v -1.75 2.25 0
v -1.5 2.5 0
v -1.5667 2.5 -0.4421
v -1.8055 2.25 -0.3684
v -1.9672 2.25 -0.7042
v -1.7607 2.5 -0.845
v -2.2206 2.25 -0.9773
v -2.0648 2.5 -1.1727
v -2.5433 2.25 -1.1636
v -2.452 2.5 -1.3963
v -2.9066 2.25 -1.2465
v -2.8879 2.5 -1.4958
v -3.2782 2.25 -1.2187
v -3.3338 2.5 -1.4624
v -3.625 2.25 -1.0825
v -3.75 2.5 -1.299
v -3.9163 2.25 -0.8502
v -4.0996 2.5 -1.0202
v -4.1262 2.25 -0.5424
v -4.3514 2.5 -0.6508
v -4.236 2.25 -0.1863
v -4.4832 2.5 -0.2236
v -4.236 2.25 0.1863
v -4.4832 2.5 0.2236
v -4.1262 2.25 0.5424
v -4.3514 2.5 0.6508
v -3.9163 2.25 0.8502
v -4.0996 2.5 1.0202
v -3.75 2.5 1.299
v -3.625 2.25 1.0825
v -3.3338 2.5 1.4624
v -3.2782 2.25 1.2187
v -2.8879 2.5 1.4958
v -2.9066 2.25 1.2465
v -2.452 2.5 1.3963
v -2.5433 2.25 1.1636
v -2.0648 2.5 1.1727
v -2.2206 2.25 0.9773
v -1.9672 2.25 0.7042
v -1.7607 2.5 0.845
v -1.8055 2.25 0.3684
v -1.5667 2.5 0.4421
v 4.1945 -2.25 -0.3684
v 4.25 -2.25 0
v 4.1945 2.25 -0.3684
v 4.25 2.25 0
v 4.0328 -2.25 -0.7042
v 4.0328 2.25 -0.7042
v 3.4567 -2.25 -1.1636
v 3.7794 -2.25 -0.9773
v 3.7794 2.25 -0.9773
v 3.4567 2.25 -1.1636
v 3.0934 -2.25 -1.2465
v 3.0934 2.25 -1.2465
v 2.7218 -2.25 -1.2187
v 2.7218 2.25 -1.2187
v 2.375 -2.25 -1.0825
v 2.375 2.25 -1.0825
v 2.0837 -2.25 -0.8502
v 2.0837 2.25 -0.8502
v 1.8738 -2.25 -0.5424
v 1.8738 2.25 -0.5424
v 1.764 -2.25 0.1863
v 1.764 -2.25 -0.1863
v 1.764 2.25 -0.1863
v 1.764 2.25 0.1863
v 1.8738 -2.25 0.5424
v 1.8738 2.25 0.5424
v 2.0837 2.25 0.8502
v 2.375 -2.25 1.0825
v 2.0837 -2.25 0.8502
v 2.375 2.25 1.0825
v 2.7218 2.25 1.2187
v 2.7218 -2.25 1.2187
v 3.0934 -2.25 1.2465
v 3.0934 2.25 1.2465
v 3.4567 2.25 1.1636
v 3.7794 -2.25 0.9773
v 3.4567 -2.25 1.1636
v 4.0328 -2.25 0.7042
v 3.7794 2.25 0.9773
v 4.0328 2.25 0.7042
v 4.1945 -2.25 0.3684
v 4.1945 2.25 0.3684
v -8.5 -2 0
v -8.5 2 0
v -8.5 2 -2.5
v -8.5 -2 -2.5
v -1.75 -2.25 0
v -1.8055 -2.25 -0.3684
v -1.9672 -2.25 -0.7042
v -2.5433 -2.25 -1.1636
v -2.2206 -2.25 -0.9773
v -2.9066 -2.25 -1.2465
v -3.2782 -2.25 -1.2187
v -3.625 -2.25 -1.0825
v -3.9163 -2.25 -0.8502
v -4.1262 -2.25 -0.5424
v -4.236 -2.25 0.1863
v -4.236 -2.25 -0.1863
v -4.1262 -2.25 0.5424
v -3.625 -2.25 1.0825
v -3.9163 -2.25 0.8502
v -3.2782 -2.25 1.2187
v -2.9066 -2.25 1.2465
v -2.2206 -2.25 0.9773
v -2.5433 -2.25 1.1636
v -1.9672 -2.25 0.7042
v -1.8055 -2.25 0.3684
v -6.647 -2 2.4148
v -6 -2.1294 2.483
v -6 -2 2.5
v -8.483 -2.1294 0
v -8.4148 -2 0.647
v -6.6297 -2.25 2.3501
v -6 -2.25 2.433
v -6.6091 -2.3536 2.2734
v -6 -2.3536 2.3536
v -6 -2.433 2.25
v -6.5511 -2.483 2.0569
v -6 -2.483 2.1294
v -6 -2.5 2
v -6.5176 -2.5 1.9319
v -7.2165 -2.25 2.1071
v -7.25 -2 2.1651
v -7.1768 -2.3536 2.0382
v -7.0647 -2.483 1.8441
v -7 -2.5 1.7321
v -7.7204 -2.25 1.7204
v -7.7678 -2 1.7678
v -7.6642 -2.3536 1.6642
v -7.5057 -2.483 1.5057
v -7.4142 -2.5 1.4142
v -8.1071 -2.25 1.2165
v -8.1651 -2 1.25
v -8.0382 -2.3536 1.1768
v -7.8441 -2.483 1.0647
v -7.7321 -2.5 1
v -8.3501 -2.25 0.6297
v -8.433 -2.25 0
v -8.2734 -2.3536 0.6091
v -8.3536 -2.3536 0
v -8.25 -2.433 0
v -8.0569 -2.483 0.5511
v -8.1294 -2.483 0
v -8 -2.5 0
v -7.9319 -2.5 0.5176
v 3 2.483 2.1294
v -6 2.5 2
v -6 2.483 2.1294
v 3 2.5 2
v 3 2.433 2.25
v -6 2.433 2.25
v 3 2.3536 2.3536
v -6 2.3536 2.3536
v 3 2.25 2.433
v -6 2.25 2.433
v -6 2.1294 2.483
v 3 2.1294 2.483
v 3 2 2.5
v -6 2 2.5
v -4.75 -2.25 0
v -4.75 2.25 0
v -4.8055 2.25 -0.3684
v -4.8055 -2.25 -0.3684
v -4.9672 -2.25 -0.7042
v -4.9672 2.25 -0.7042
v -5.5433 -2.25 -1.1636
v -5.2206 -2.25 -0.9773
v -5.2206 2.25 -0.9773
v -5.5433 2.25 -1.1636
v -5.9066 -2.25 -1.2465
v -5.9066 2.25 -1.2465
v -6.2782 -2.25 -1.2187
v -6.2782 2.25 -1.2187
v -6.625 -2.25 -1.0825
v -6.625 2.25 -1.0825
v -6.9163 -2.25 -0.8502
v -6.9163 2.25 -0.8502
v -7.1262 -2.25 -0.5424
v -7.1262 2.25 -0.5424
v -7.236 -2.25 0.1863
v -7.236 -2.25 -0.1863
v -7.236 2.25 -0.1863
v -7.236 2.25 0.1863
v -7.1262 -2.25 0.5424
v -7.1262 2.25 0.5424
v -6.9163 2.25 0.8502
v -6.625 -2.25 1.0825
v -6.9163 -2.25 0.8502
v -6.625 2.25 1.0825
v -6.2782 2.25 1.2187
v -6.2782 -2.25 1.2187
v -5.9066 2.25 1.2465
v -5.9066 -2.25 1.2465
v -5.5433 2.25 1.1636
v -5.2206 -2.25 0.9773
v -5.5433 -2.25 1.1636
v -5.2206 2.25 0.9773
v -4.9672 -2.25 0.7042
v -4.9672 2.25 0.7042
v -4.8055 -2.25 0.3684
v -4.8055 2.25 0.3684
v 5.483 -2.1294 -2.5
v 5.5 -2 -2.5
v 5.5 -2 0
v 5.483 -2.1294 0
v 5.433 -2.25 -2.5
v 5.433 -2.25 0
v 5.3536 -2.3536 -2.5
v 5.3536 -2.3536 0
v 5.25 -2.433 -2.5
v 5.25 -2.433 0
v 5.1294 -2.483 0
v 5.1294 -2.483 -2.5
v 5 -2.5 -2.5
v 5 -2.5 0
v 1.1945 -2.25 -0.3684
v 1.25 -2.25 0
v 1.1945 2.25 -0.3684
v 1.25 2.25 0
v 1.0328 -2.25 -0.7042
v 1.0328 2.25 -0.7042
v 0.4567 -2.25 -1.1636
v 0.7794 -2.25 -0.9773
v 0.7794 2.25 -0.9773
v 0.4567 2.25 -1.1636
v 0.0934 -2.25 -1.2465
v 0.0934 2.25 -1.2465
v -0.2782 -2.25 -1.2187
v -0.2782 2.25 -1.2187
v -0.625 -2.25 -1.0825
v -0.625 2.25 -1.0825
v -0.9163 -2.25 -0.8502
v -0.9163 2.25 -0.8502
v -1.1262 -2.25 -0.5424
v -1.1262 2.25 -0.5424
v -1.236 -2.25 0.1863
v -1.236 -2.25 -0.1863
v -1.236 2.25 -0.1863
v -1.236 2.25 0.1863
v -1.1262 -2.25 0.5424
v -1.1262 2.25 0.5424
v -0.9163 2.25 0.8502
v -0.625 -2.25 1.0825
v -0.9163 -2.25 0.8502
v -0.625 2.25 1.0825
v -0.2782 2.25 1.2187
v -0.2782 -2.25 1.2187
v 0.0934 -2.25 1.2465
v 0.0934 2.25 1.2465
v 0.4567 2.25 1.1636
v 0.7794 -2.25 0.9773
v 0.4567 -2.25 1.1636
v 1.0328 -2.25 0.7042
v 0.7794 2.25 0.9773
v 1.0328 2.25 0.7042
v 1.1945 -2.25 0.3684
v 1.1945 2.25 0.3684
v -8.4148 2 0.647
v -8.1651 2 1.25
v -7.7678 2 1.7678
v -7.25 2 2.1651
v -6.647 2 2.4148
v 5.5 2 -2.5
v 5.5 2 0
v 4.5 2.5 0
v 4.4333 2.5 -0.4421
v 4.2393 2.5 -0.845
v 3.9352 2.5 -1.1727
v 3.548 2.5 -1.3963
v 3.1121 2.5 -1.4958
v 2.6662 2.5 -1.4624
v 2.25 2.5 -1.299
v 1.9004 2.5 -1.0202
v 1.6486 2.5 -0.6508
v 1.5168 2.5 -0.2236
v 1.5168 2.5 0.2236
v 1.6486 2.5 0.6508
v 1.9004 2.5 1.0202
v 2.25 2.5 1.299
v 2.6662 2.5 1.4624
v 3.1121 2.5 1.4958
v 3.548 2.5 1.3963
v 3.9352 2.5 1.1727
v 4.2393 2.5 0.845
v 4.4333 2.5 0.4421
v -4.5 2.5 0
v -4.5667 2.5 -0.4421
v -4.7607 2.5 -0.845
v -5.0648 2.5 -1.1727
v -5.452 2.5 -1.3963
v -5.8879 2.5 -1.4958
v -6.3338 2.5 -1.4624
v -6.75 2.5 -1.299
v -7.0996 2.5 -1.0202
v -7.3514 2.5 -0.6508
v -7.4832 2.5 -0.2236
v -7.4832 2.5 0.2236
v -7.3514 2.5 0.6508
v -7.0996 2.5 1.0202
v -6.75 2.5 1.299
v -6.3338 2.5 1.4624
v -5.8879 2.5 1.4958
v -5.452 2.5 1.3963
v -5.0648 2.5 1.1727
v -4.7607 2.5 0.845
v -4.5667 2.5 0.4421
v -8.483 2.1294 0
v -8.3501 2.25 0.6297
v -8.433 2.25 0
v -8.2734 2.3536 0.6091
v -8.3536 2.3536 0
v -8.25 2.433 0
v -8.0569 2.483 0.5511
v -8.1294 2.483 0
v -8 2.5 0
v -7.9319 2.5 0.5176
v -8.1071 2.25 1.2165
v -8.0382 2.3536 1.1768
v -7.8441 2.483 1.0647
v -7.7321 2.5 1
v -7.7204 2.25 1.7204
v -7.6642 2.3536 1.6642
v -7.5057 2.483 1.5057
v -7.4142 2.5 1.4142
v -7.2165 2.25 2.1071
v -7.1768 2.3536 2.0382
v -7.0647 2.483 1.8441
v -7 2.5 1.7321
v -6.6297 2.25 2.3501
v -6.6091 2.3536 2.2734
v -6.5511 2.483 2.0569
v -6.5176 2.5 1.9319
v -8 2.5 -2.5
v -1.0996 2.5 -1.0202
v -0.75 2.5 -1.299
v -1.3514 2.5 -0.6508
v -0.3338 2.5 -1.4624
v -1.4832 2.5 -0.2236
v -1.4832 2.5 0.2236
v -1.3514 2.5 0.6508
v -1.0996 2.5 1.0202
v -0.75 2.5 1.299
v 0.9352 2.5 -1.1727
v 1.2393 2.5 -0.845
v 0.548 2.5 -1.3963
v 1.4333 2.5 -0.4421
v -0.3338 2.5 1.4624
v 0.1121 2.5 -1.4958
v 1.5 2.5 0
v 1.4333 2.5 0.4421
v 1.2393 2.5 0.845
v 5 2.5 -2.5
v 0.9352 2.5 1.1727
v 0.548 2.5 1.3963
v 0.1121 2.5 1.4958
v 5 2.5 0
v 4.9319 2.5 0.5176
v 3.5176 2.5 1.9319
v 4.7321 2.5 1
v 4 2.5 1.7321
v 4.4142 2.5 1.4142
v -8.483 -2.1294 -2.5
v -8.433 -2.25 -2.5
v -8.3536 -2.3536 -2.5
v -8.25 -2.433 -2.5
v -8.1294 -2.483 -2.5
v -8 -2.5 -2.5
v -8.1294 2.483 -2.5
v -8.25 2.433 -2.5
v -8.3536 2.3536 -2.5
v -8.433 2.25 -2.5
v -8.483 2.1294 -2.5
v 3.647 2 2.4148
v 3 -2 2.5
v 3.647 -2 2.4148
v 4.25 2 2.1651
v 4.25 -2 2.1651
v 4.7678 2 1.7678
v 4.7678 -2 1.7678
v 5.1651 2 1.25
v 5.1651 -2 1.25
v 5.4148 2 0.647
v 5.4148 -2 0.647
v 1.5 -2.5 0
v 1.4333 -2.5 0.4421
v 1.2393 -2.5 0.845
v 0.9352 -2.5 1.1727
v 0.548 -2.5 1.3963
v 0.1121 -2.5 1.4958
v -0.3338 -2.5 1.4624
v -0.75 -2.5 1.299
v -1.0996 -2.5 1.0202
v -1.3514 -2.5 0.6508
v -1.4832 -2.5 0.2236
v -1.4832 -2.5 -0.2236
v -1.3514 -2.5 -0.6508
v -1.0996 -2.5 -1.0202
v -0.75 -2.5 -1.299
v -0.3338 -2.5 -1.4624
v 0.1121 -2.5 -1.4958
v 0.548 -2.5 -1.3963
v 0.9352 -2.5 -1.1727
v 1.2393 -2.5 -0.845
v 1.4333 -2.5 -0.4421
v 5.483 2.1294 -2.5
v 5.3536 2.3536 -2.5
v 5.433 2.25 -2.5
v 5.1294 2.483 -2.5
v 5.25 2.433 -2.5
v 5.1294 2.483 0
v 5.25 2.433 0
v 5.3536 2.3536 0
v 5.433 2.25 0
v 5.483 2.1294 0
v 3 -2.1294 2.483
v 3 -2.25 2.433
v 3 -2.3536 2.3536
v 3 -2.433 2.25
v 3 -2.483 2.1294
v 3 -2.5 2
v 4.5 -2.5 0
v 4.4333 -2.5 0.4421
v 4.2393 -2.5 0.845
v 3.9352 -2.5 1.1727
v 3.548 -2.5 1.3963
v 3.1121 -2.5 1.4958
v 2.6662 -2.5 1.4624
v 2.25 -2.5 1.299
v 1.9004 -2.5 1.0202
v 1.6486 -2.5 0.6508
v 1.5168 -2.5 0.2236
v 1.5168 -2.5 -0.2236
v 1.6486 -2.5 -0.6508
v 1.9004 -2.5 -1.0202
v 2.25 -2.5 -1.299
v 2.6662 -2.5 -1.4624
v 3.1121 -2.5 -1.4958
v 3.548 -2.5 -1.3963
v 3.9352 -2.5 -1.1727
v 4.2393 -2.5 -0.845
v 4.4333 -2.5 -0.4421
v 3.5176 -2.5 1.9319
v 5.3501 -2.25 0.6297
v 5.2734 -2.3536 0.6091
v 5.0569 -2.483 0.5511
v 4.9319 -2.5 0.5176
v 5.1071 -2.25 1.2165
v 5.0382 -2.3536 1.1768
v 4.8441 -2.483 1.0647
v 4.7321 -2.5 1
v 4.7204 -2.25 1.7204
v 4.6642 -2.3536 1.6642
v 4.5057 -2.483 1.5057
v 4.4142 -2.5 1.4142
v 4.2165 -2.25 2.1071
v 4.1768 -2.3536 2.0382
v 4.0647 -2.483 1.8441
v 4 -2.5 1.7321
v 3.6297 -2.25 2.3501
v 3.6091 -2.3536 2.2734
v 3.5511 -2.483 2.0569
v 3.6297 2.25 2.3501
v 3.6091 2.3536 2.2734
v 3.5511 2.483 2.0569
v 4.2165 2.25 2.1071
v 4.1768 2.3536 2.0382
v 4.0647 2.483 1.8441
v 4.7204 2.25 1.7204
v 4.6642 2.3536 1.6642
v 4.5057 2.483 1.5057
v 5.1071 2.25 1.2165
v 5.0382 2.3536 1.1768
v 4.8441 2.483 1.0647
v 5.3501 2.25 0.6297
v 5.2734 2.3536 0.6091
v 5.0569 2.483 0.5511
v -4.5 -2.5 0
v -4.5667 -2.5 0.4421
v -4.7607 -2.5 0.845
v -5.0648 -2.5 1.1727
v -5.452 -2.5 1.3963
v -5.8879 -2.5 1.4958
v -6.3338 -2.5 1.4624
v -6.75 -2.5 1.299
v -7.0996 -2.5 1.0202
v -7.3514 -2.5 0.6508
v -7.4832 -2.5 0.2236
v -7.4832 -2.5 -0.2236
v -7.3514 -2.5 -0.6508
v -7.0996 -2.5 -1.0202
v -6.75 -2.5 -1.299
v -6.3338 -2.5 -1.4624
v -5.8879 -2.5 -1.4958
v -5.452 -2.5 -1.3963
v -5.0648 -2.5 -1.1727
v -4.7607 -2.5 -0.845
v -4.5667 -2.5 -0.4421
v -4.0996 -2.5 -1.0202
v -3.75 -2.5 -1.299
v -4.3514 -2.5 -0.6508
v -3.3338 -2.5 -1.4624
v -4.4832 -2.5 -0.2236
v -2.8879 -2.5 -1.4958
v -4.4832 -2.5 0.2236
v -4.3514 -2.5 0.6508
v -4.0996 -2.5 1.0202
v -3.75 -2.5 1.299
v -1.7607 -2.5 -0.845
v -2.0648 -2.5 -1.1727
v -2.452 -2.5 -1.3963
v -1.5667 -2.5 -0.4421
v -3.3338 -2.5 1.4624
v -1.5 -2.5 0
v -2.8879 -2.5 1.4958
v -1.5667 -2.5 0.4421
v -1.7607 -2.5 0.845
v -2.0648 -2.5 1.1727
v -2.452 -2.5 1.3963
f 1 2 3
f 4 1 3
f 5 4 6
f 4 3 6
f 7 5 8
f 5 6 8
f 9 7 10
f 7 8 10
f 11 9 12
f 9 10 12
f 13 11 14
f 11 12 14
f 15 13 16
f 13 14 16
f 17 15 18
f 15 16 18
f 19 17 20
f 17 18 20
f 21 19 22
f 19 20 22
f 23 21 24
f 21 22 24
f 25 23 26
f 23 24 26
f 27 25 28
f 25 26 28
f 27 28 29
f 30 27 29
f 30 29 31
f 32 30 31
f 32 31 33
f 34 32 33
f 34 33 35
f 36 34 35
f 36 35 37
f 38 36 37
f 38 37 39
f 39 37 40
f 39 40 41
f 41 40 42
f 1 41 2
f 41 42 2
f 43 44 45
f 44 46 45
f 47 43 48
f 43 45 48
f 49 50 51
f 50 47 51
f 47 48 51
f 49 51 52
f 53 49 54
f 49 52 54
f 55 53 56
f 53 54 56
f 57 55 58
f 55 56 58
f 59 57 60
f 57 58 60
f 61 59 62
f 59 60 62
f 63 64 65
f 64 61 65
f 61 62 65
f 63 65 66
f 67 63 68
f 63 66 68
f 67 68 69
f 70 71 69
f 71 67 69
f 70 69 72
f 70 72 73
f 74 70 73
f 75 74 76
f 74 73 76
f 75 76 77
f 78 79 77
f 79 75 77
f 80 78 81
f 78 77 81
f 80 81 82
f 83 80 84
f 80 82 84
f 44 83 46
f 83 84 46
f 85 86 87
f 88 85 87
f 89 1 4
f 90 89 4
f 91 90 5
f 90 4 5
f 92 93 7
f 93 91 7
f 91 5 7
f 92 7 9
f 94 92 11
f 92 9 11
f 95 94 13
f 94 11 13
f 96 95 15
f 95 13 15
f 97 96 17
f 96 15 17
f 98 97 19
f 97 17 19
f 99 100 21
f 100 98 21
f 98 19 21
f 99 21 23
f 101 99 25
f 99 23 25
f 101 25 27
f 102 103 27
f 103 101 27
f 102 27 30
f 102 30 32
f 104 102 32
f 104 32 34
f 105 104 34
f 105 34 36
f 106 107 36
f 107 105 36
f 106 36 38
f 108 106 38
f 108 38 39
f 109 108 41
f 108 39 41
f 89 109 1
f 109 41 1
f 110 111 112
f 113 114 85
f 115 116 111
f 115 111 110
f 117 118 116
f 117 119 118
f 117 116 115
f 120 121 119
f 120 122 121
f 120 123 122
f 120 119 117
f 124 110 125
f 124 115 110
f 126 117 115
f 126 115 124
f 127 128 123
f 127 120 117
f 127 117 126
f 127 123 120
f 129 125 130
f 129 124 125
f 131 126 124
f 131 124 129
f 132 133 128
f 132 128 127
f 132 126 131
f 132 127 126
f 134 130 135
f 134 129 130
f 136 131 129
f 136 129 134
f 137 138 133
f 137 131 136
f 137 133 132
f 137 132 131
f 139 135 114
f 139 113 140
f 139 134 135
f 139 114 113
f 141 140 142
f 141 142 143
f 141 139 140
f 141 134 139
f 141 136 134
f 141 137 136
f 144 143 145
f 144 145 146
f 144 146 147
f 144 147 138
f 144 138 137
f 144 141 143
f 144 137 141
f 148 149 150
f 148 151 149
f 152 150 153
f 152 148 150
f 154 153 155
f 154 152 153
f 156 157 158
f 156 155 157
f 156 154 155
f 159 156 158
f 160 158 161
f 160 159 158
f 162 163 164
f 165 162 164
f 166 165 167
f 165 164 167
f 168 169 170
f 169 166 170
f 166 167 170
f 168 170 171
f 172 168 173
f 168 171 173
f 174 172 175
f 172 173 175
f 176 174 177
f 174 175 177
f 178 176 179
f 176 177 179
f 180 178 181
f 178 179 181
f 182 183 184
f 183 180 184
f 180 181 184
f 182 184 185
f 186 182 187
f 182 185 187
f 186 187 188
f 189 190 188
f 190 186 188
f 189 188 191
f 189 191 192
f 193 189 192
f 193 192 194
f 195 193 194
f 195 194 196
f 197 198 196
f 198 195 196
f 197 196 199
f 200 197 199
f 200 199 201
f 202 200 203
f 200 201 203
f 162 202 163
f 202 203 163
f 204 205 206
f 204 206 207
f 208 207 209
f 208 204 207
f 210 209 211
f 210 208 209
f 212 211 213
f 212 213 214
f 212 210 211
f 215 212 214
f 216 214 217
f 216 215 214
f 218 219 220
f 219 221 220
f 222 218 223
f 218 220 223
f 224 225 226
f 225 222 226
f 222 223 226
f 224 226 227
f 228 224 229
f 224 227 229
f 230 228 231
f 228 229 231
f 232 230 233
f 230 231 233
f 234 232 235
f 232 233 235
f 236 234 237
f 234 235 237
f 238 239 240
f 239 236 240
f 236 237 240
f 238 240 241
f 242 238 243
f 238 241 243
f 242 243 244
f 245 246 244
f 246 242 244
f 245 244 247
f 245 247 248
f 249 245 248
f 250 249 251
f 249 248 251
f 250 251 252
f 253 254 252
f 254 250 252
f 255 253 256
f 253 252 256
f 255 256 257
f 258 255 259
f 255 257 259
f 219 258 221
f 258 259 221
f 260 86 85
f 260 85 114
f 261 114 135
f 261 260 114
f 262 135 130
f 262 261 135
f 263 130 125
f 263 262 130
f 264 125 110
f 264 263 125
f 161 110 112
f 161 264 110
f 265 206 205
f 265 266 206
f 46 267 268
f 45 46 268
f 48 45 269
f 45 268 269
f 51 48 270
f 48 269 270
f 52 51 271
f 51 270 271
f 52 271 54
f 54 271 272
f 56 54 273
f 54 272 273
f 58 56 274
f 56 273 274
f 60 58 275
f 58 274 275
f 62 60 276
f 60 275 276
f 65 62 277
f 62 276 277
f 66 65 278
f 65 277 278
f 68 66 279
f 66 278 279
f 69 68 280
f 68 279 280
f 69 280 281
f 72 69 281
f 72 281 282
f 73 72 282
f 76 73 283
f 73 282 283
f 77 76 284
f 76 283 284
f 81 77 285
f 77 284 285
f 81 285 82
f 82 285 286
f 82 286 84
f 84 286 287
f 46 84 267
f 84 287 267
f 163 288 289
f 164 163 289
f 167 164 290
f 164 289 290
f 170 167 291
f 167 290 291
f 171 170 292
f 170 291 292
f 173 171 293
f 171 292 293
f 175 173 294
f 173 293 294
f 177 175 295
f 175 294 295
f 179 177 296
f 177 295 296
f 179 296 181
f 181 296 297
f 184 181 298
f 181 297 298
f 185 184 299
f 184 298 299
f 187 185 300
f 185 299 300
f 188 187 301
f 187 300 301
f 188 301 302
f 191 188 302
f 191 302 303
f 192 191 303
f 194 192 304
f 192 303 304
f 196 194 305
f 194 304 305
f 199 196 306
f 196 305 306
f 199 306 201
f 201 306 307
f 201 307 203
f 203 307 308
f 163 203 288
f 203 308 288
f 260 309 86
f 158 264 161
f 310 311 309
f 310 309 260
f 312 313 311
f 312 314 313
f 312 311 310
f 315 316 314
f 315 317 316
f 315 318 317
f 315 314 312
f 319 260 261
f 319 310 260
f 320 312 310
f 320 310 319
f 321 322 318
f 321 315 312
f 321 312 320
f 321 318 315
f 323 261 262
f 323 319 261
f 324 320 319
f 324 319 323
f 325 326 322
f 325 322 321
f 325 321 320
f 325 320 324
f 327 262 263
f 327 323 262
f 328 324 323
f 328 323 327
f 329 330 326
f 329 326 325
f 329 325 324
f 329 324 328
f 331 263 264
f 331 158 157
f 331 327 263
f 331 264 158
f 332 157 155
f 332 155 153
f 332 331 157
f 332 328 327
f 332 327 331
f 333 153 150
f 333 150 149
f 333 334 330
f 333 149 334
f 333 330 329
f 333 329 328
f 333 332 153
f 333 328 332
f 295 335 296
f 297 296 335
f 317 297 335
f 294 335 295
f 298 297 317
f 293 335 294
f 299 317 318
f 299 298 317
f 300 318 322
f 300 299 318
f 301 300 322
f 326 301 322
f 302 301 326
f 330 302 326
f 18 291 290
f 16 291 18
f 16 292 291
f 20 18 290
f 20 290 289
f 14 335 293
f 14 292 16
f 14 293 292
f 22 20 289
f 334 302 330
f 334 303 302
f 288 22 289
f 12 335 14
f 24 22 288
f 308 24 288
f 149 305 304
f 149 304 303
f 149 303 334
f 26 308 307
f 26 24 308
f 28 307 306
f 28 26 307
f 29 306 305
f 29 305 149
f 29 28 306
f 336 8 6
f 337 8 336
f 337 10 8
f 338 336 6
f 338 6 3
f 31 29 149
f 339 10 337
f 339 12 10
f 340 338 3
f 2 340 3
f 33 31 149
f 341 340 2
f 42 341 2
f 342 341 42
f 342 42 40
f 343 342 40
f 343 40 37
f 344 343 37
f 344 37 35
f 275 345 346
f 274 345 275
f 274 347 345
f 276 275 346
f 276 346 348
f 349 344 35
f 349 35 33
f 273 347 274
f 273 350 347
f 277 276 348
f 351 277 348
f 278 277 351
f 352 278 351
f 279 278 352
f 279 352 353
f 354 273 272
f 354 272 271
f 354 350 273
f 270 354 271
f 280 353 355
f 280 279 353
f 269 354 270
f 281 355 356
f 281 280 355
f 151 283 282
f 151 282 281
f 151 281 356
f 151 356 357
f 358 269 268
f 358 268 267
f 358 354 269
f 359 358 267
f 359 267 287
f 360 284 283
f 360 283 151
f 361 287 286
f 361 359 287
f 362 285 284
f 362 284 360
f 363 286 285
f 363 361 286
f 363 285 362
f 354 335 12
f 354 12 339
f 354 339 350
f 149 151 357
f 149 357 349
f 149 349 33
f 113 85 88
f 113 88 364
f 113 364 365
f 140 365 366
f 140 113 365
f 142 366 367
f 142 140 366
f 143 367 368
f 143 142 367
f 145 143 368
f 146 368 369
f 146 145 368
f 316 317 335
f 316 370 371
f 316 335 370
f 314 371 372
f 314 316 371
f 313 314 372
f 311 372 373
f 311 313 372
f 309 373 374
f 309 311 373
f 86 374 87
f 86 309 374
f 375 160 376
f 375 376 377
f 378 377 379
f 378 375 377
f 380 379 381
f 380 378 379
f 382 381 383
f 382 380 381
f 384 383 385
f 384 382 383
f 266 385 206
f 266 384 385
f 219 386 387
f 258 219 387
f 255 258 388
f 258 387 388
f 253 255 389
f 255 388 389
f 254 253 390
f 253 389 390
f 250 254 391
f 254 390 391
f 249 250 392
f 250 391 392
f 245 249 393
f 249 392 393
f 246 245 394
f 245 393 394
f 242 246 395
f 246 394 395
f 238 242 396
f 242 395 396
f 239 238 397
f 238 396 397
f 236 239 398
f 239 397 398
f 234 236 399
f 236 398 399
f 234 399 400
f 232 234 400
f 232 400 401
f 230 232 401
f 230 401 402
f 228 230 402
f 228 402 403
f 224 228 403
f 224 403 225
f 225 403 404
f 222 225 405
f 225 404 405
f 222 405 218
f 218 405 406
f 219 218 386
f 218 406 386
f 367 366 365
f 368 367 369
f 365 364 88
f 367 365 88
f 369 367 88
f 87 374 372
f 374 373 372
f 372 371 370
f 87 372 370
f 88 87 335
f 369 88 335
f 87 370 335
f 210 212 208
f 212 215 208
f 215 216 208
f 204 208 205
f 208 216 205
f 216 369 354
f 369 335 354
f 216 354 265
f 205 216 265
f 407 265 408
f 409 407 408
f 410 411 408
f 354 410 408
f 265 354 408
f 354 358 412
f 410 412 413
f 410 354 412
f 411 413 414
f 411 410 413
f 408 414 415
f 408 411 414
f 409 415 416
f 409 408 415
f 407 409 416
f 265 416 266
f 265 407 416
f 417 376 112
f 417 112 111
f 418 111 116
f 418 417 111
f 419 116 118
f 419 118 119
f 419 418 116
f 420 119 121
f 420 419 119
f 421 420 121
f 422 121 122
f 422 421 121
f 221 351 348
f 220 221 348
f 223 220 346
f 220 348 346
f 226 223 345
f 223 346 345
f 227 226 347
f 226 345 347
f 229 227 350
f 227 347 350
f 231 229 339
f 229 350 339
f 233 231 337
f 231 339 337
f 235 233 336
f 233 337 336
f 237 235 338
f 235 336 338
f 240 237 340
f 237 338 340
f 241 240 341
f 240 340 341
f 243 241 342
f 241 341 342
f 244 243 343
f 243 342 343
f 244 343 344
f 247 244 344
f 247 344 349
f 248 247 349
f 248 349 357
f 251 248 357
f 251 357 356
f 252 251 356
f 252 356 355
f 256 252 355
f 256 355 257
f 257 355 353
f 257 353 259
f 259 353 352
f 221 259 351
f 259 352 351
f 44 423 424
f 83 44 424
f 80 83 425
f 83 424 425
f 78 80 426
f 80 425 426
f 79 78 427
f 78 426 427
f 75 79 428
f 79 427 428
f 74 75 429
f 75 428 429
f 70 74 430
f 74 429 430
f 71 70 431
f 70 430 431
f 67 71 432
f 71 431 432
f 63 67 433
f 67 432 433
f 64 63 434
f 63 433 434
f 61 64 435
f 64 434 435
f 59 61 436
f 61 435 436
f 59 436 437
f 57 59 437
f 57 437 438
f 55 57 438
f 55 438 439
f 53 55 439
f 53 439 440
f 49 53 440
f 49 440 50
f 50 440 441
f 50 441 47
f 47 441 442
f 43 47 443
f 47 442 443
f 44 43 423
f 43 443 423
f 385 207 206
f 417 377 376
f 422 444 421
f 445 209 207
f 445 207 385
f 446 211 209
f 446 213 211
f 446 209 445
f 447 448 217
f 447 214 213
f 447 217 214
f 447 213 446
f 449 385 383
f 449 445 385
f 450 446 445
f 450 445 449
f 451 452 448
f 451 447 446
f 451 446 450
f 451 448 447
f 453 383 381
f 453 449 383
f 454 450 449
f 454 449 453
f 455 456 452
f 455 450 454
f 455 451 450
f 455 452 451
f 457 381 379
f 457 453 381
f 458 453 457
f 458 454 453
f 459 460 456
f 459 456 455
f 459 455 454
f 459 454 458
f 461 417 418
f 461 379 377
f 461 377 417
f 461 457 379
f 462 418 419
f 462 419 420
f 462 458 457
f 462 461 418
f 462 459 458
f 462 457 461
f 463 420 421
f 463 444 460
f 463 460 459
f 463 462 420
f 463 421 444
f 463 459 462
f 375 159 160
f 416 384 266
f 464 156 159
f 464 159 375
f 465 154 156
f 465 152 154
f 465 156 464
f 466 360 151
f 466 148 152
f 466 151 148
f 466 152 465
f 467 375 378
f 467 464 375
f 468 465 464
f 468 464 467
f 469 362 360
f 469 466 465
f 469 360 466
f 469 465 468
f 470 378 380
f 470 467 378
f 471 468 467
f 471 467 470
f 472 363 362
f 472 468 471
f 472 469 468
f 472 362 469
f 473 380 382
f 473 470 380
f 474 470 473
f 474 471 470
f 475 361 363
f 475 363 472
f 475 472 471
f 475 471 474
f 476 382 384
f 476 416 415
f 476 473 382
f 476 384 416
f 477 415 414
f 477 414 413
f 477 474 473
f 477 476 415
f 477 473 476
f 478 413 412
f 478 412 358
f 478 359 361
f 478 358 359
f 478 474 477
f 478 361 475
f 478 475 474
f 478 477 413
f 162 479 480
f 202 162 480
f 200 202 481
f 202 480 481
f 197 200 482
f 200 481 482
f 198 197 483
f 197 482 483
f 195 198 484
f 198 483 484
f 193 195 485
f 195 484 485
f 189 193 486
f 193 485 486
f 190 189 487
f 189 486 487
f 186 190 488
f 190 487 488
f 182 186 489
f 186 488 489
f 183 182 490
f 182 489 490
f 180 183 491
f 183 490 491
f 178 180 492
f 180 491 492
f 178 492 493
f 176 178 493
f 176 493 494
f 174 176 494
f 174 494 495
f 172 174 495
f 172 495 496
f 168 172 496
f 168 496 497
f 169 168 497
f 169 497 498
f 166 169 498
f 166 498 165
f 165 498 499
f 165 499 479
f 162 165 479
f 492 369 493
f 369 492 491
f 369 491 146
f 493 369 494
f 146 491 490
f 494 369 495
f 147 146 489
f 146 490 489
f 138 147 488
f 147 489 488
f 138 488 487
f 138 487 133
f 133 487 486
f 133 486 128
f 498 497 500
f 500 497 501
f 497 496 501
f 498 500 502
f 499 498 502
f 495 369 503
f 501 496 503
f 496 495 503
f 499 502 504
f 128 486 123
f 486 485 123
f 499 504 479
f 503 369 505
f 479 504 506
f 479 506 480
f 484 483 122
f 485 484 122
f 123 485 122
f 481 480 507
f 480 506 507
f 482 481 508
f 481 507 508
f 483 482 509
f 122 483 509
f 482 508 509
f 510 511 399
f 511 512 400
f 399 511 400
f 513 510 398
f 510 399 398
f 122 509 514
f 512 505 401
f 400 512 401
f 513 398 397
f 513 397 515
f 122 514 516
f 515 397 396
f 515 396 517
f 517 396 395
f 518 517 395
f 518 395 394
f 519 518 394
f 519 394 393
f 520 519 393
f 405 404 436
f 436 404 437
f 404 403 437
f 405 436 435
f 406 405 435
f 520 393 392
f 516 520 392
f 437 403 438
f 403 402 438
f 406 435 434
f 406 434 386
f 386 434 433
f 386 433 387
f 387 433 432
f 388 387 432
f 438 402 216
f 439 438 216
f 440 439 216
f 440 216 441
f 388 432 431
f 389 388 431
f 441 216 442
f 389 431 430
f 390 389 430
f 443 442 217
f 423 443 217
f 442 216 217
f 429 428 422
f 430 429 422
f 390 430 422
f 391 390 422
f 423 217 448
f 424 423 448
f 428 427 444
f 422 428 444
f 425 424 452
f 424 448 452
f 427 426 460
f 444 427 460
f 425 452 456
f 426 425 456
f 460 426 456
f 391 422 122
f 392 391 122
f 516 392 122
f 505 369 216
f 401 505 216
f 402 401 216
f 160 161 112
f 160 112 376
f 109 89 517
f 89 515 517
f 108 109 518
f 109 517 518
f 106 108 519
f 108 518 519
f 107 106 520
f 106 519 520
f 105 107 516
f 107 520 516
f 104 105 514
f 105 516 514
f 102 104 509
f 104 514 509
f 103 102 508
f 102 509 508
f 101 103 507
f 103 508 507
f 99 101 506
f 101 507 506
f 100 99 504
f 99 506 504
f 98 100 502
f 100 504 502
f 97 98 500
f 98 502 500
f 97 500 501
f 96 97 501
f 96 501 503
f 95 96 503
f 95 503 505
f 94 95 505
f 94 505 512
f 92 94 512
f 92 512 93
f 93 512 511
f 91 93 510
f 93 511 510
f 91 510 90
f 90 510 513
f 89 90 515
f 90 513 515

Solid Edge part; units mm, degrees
sketch "Sketch1" plane through (0, 0, 0) normal (0, -1, 0) x (1, 0, 0)
  circle A0 centre (0, 0) radius 1.25
  circle A1 centre (3, 0) radius 1.25
  circle A2 centre (-3, 0) radius 1.25
  circle A3 centre (-6, 0) radius 1.25
  line L0 (-6, 2.5) -> (3, 2.5)
  line L1 (5.5, 0) -> (5.5, -2.5)
  line L2 (3, -2.5) -> (5.5, -2.5)
  line L3 (3, -2.5) -> (-6, -2.5)
  line L4 (-6, -2.5) -> (-8.5, -2.5)
  line L5 (-8.5, 0) -> (-8.5, -2.5)
  arc A4 (-8.5, 0) -> (-6, 2.5) centre (-6, 0) cw
  arc A5 (3, 2.5) -> (5.5, 0) centre (3, 0) cw
extrude "Protrusion1" add sketch "Sketch1" along normal mid plane 5
fillet "Verrundung_1" radius 0.5 10 edges at (-1.5, -2.5, 2.5) (4.7678, -2.5, 1.7678) (5.5, -2.5, -1.25) (-7.7678, -2.5, 1.7678) (-8.5, -2.5, -1.25) (-1.5, 2.5, 2.5) (4.7678, 2.5, 1.7678) (5.5, 2.5, -1.25) (-7.7678, 2.5, 1.7678) (-8.5, 2.5, -1.25)
chamfer "Fase_1" distance 0.25 angle 45 8 edges at (-7.25, -2.5, 0) (-4.25, -2.5, 0) (-1.25, -2.5, 0) (1.75, -2.5, 0) (1.75, 2.5, 0) (-1.25, 2.5, 0) (-4.25, 2.5, 0) (-7.25, 2.5, 0)
